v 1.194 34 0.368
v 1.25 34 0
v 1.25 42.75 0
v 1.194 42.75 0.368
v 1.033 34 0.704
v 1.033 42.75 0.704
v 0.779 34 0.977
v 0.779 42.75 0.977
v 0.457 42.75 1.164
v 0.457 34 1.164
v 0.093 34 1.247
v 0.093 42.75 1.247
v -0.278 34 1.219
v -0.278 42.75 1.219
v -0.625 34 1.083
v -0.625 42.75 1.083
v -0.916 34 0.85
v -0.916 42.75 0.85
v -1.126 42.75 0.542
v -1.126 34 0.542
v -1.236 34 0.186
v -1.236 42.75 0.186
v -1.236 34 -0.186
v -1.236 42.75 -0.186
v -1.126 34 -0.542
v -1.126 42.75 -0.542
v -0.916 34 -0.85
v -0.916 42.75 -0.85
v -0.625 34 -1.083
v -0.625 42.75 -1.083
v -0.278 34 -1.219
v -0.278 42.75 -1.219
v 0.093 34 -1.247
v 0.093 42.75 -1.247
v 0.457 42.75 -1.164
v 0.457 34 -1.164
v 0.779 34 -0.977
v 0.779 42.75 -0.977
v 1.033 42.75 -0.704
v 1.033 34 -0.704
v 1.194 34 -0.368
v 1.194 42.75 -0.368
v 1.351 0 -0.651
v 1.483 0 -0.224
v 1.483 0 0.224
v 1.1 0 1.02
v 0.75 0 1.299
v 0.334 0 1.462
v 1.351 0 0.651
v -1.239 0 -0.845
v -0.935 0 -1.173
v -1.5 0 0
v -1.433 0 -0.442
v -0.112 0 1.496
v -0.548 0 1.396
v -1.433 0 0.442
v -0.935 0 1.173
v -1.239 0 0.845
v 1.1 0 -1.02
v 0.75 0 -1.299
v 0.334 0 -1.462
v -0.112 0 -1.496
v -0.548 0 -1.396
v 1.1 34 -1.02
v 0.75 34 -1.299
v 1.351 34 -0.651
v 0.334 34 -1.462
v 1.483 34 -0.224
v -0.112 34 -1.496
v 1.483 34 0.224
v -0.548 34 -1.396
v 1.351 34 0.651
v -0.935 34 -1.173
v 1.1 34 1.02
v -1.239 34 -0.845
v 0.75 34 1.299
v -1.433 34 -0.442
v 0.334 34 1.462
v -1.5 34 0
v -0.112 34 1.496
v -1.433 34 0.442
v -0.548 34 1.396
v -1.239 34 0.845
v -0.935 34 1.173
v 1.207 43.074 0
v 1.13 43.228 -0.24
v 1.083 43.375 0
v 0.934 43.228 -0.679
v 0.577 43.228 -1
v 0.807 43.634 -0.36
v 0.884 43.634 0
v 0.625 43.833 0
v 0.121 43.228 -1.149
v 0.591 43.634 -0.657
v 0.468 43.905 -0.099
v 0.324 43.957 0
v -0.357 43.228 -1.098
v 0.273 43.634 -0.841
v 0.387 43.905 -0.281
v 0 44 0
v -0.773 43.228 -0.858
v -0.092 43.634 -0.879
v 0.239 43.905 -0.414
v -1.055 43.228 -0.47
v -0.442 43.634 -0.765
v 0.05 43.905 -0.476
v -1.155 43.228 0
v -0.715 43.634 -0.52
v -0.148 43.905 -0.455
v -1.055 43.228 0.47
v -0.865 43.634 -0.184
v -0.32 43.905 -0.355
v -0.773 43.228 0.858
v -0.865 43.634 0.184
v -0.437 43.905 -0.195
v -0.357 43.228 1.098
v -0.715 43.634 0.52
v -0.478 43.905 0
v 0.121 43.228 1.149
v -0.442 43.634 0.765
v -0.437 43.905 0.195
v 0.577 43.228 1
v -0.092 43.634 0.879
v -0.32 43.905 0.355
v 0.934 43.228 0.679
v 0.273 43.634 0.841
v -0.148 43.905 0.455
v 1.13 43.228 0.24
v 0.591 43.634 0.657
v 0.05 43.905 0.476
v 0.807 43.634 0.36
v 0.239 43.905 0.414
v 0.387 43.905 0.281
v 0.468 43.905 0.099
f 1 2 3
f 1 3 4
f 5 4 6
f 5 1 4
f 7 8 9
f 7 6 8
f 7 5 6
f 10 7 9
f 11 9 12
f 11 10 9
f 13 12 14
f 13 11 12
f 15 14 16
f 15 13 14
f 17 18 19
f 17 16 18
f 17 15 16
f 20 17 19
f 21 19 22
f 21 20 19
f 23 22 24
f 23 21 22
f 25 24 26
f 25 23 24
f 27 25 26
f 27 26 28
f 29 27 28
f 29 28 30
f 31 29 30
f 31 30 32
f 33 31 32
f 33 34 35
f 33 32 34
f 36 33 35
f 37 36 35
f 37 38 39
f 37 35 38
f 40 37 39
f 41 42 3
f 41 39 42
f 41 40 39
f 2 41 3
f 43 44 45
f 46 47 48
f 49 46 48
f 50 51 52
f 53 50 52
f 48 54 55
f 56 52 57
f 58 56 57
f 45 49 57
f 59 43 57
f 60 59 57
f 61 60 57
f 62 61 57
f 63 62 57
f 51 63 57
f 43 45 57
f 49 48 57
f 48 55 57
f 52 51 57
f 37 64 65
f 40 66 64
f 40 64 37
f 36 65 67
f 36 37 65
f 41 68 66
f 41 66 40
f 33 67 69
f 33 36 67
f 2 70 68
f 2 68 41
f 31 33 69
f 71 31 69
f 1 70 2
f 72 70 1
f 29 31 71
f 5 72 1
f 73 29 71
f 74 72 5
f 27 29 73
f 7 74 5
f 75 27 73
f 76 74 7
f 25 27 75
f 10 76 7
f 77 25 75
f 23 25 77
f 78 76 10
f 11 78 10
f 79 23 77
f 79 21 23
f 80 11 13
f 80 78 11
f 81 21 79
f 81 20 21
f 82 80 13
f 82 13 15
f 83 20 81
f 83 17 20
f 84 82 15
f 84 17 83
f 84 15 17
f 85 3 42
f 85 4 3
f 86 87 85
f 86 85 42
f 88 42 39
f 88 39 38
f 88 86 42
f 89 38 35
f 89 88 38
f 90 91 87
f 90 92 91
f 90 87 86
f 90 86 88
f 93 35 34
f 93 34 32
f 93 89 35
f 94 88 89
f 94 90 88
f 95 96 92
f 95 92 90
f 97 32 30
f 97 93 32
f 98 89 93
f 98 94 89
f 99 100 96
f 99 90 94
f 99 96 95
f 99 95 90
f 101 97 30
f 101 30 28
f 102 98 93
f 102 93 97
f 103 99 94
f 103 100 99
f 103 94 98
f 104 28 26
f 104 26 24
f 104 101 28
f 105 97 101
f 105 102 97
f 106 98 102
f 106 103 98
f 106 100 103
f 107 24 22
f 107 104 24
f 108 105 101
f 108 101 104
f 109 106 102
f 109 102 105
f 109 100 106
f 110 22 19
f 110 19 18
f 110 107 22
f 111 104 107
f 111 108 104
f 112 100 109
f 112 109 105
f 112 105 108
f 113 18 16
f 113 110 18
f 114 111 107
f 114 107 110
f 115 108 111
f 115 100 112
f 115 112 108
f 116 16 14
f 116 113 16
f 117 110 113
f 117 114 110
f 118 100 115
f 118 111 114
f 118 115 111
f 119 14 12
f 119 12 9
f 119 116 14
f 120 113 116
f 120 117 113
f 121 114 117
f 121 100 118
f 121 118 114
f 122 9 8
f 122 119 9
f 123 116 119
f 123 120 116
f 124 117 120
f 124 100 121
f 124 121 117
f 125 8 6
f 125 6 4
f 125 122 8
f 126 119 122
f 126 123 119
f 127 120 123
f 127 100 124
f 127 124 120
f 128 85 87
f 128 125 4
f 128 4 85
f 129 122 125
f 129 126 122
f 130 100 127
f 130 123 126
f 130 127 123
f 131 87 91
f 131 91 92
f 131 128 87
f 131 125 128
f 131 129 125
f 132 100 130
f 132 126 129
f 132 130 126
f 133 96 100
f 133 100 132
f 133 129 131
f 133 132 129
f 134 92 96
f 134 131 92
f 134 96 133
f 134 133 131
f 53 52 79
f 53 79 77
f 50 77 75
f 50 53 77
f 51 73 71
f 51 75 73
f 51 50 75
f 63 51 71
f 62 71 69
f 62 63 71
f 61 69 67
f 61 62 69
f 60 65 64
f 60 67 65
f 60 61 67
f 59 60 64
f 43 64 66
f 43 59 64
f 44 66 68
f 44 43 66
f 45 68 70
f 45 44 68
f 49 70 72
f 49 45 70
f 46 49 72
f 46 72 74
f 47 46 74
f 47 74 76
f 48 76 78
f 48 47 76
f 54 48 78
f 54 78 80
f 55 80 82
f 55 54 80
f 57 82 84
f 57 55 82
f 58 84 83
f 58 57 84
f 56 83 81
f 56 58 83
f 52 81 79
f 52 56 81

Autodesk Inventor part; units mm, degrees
ref_plane "YZ Plane" through (0, 0, 0) normal (1, 0, 0) x (0, 1, 0)
ref_plane "XZ Plane" through (0, 0, 0) normal (0, 1, 0) x (-1, 0, 0)
ref_plane "XY Plane" through (0, 0, 0) normal (0, 0, 1) x (1, 0, 0)
sketch "Sketch1" plane through (0, 0, 0) normal (0, 1, 0) x (-1, 0, 0)
  circle A0 centre (0, 0) radius 1.5
  dimension "d0" = 3
extrude "Extrusion1" add sketch "Sketch1" along normal blind 34
sketch "Sketch2" plane through (0, 34, 0) normal (0, 1, 0) x (1, 0, 0)
  circle A0 centre (0, 0) radius 1.25
  dimension "d3" = 2.5
extrude "Extrusion2" add sketch "Sketch2" along normal blind 10
thread "Thread1" size "M3x0.5" class "6g" standard "ANSI Metric M Profile" length 11 offset 23
fillet "Fillet1" radius 1.25 1 edges at (-1.25, 44, 0)
properties material "Stainless Steel"
